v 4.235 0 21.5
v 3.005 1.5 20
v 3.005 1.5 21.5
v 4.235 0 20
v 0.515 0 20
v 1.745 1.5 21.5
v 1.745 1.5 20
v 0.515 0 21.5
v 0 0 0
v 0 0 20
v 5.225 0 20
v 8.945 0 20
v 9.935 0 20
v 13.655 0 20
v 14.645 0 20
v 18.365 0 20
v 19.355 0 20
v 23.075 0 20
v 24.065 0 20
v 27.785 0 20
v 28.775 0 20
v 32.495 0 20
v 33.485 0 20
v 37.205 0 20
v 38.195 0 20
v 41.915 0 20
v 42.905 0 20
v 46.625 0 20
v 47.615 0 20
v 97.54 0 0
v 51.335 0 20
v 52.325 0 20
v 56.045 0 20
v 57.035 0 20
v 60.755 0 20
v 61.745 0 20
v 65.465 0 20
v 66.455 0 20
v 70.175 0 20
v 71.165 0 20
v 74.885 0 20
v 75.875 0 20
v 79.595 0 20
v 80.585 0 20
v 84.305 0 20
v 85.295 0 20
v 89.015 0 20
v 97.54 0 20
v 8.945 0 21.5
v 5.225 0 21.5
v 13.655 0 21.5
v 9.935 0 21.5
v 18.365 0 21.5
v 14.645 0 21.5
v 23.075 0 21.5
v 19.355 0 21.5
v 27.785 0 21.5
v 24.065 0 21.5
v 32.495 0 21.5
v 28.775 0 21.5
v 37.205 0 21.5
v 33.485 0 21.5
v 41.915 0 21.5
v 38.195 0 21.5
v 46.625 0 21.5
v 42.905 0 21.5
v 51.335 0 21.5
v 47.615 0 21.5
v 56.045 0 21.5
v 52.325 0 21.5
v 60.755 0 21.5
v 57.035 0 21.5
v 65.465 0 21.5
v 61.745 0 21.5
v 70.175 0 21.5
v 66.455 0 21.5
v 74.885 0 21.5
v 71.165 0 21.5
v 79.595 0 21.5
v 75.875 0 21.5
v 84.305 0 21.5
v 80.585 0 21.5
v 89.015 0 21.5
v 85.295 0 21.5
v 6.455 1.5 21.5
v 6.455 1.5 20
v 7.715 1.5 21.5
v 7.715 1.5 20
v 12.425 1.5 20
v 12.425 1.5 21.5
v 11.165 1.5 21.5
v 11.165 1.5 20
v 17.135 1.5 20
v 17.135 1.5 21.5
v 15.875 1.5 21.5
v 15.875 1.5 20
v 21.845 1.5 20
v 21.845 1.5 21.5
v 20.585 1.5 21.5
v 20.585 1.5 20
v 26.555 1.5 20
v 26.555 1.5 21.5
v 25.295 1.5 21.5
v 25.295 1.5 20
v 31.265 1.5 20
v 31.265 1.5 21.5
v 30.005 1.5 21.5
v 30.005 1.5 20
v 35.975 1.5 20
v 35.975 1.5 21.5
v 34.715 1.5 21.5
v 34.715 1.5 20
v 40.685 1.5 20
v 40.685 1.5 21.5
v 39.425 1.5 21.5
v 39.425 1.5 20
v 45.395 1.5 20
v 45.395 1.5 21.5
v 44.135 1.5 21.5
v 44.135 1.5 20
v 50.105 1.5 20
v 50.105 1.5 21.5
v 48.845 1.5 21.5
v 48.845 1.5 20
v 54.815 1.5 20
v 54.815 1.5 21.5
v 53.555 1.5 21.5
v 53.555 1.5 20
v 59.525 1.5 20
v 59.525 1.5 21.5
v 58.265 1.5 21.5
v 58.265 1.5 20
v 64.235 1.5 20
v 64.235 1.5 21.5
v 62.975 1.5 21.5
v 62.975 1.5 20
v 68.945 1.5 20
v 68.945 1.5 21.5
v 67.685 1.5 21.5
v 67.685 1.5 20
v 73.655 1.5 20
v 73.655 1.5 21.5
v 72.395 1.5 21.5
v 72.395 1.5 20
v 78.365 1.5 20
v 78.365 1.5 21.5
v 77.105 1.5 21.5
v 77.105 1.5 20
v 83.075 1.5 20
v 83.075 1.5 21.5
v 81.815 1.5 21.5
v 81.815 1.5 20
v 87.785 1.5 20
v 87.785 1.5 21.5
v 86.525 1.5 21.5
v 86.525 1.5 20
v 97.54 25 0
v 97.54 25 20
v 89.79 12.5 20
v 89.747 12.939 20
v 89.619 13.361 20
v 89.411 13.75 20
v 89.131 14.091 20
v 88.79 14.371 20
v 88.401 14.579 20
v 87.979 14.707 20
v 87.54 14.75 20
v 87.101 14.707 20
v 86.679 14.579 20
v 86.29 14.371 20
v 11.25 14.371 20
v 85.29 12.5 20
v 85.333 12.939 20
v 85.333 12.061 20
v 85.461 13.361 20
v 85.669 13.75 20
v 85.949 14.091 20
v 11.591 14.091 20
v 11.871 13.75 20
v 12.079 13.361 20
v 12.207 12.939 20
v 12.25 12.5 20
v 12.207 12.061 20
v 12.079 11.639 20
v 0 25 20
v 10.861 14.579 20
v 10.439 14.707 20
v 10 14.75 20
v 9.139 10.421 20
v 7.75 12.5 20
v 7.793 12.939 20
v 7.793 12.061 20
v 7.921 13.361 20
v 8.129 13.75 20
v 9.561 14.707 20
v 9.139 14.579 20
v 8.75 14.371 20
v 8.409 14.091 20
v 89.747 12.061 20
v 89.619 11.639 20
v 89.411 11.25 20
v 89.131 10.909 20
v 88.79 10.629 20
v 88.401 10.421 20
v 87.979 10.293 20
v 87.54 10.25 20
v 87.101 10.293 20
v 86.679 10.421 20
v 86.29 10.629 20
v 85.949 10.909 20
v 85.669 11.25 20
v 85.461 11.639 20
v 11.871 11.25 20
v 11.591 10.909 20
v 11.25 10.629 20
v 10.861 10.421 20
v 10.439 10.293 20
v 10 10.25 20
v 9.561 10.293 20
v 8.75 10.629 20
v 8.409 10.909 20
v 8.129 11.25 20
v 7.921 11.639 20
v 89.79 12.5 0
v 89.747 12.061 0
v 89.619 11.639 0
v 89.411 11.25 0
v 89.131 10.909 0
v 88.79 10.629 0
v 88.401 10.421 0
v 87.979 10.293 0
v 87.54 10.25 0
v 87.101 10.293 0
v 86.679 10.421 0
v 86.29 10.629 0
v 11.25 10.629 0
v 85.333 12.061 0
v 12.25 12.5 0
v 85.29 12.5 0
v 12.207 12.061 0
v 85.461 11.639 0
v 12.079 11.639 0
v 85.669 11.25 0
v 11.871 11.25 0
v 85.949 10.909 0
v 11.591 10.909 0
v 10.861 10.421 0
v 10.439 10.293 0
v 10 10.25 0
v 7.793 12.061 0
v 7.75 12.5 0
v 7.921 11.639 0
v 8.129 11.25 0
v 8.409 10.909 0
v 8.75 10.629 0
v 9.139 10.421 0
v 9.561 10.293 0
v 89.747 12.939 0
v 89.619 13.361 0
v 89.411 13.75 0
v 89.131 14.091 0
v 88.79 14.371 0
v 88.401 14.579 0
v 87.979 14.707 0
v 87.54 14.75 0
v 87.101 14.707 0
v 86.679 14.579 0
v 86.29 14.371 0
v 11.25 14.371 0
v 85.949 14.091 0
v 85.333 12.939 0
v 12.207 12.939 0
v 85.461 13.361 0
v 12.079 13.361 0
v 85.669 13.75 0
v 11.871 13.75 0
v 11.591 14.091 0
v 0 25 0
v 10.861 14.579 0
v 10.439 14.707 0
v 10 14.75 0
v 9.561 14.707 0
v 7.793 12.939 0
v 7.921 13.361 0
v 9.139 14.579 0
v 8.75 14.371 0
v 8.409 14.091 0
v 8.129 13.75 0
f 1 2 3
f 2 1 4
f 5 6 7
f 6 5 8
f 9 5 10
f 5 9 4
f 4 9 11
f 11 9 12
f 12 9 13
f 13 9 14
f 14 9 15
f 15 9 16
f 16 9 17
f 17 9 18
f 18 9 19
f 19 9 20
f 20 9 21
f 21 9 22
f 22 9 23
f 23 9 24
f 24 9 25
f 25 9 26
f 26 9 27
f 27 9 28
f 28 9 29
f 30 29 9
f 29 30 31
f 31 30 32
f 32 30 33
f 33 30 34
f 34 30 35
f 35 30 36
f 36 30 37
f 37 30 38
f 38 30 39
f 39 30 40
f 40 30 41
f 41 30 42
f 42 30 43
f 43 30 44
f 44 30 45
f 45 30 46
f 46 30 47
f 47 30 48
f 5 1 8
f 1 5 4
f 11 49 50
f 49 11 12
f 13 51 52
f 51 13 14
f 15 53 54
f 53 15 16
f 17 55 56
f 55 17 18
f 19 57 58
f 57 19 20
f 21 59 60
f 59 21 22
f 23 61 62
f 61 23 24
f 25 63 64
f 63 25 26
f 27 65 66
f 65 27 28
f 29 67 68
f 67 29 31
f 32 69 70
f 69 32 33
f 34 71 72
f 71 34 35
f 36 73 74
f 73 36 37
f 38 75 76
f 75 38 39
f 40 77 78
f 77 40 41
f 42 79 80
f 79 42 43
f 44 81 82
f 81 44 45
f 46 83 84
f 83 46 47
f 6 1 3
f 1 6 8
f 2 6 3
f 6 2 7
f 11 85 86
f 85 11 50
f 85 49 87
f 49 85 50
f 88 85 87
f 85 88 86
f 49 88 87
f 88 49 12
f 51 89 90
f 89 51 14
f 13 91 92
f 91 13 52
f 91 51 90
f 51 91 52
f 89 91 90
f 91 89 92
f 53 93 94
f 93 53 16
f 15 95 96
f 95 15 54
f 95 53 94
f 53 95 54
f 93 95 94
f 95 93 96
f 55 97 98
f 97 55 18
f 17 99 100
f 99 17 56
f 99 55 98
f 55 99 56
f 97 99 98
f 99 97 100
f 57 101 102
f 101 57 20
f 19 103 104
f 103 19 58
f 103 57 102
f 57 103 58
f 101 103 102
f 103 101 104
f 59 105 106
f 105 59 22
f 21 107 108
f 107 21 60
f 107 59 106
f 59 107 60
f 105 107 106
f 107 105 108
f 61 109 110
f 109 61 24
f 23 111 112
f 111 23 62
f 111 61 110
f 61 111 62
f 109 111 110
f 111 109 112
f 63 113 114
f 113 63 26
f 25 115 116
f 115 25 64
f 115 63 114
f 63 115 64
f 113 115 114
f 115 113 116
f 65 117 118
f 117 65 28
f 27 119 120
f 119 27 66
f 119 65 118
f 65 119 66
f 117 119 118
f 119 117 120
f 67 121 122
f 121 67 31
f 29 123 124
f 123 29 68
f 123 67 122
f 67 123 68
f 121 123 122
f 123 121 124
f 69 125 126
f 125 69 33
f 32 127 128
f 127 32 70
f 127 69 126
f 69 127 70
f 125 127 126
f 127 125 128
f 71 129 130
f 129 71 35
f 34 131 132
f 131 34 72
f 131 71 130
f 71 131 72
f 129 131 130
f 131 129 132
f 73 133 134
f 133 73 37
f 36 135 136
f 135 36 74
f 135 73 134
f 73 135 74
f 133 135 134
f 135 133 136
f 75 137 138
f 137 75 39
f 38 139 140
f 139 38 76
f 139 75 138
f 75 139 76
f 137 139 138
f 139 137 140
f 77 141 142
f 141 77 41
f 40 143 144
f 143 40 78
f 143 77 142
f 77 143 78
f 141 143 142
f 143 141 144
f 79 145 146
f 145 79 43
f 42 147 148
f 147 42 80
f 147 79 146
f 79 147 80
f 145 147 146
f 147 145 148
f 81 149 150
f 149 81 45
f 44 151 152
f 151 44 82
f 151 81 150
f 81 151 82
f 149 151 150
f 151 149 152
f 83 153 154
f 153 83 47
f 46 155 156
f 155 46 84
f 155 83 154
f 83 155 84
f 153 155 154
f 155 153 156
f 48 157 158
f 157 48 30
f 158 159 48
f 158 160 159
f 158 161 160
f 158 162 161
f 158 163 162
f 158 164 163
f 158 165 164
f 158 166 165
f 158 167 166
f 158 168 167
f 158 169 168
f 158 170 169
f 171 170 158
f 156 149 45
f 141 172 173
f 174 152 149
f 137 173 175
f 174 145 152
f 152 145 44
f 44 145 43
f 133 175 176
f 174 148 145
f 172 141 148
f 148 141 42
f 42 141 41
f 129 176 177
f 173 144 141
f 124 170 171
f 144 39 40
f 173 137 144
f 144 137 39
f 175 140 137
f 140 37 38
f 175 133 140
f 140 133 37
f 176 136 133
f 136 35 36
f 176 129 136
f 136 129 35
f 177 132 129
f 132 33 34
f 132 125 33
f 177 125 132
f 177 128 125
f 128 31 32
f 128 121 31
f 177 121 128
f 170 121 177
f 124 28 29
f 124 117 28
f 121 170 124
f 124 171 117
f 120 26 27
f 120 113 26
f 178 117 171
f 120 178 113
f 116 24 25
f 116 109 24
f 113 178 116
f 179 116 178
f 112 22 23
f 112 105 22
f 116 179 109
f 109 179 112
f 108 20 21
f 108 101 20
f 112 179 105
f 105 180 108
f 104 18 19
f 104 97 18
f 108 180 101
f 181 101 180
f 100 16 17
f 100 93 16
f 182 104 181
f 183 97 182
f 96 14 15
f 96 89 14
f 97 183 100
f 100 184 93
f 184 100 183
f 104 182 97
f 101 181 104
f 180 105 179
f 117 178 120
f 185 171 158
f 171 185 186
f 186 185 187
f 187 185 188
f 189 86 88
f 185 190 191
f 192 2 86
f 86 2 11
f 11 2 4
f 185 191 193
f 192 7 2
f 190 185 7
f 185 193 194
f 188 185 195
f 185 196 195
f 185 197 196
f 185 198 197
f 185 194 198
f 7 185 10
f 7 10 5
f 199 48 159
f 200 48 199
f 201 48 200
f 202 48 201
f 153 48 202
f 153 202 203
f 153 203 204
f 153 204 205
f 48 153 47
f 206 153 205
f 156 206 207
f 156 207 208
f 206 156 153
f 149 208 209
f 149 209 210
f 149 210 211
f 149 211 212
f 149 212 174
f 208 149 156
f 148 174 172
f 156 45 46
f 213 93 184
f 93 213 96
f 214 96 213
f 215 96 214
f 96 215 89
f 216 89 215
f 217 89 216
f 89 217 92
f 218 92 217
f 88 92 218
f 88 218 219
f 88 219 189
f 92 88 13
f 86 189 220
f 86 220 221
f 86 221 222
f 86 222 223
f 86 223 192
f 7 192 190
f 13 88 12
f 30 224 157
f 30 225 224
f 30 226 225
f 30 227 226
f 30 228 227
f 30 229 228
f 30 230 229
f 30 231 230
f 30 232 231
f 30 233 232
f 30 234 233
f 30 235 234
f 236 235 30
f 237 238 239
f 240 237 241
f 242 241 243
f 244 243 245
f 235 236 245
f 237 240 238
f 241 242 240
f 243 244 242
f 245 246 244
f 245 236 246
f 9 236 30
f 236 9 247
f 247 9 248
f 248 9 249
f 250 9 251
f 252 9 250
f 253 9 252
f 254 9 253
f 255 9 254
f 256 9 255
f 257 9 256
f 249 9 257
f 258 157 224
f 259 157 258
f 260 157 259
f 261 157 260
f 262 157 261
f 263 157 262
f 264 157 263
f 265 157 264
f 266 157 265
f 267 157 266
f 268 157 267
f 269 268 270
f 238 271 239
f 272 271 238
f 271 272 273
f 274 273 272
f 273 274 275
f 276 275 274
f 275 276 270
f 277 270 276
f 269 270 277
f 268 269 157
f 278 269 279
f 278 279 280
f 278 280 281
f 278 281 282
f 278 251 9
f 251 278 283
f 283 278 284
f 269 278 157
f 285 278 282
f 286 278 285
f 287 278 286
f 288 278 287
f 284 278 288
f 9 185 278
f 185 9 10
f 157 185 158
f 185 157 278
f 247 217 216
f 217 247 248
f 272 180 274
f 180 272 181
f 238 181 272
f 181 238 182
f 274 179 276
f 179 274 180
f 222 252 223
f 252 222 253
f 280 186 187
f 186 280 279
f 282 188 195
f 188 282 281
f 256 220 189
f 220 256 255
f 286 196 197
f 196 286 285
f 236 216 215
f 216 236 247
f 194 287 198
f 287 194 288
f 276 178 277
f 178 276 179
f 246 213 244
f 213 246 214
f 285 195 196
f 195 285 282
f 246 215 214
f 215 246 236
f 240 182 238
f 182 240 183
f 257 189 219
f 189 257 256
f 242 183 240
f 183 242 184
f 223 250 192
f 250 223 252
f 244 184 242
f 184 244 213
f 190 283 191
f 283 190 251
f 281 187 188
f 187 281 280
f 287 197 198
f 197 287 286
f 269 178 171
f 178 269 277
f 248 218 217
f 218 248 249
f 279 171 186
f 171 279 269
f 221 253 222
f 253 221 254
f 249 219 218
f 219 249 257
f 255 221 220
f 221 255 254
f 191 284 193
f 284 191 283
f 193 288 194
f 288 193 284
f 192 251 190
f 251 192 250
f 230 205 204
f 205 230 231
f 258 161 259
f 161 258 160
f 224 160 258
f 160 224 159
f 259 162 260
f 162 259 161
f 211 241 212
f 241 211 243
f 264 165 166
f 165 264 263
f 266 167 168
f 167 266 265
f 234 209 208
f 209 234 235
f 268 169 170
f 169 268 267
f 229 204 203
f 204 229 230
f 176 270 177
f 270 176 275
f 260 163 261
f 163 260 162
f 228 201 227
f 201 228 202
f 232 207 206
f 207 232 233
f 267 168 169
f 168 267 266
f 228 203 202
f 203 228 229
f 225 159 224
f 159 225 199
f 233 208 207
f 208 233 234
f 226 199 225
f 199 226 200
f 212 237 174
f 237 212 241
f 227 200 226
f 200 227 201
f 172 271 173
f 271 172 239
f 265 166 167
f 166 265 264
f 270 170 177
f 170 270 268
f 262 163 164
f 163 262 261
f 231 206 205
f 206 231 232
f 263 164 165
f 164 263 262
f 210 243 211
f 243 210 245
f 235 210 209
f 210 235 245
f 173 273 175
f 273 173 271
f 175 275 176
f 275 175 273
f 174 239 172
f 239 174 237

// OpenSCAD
$fn = 32;

// ----------------------------------------------------------------------
// Gear rack: m=1.5 z=19, 97.54 x 25 x 21.5 mm
// ----------------------------------------------------------------------

// --- parameters (mm) ---
bar_len = 97.54;          // rack length, X
bar_w = 25;               // rack width, Y
bar_h = 21.5;             // overall height, Z
gear_module = 1.5;        // module
base_t = 20;              // tooth root line height
pitch = 4.71;             // circular pitch
tip_w = 1.26;             // tooth thickness at the tip
root_w = 3.72;            // tooth thickness at the root line
hole_d = 4.5;             // mounting hole
sink = 0.6;               // tooth root overlap into the body

tooth_span = 89.53;

module tooth(x0) {
  /* 20 deg flank profile, sunk into the body for a positive overlap */
  translate([x0, 0, base_t - sink])
    linear_extrude(height = bar_h - base_t + sink)
      polygon(points = [[-root_w / 2, 0], [root_w / 2, 0],
                        [tip_w / 2, bar_h - base_t],
                        [-tip_w / 2, bar_h - base_t]]);
}

difference() {
  union() {
    cube([bar_len, bar_w, base_t]);
    for (i = [0 : 19 - 1])
      tooth((i + 0.5) * pitch + (tooth_span - 19 * pitch) / 2);
  }
  translate([10, 12.5, -1]) cylinder(h = base_t + 2, d = hole_d);
  translate([87.54, 12.5, -1]) cylinder(h = base_t + 2, d = hole_d);
}
